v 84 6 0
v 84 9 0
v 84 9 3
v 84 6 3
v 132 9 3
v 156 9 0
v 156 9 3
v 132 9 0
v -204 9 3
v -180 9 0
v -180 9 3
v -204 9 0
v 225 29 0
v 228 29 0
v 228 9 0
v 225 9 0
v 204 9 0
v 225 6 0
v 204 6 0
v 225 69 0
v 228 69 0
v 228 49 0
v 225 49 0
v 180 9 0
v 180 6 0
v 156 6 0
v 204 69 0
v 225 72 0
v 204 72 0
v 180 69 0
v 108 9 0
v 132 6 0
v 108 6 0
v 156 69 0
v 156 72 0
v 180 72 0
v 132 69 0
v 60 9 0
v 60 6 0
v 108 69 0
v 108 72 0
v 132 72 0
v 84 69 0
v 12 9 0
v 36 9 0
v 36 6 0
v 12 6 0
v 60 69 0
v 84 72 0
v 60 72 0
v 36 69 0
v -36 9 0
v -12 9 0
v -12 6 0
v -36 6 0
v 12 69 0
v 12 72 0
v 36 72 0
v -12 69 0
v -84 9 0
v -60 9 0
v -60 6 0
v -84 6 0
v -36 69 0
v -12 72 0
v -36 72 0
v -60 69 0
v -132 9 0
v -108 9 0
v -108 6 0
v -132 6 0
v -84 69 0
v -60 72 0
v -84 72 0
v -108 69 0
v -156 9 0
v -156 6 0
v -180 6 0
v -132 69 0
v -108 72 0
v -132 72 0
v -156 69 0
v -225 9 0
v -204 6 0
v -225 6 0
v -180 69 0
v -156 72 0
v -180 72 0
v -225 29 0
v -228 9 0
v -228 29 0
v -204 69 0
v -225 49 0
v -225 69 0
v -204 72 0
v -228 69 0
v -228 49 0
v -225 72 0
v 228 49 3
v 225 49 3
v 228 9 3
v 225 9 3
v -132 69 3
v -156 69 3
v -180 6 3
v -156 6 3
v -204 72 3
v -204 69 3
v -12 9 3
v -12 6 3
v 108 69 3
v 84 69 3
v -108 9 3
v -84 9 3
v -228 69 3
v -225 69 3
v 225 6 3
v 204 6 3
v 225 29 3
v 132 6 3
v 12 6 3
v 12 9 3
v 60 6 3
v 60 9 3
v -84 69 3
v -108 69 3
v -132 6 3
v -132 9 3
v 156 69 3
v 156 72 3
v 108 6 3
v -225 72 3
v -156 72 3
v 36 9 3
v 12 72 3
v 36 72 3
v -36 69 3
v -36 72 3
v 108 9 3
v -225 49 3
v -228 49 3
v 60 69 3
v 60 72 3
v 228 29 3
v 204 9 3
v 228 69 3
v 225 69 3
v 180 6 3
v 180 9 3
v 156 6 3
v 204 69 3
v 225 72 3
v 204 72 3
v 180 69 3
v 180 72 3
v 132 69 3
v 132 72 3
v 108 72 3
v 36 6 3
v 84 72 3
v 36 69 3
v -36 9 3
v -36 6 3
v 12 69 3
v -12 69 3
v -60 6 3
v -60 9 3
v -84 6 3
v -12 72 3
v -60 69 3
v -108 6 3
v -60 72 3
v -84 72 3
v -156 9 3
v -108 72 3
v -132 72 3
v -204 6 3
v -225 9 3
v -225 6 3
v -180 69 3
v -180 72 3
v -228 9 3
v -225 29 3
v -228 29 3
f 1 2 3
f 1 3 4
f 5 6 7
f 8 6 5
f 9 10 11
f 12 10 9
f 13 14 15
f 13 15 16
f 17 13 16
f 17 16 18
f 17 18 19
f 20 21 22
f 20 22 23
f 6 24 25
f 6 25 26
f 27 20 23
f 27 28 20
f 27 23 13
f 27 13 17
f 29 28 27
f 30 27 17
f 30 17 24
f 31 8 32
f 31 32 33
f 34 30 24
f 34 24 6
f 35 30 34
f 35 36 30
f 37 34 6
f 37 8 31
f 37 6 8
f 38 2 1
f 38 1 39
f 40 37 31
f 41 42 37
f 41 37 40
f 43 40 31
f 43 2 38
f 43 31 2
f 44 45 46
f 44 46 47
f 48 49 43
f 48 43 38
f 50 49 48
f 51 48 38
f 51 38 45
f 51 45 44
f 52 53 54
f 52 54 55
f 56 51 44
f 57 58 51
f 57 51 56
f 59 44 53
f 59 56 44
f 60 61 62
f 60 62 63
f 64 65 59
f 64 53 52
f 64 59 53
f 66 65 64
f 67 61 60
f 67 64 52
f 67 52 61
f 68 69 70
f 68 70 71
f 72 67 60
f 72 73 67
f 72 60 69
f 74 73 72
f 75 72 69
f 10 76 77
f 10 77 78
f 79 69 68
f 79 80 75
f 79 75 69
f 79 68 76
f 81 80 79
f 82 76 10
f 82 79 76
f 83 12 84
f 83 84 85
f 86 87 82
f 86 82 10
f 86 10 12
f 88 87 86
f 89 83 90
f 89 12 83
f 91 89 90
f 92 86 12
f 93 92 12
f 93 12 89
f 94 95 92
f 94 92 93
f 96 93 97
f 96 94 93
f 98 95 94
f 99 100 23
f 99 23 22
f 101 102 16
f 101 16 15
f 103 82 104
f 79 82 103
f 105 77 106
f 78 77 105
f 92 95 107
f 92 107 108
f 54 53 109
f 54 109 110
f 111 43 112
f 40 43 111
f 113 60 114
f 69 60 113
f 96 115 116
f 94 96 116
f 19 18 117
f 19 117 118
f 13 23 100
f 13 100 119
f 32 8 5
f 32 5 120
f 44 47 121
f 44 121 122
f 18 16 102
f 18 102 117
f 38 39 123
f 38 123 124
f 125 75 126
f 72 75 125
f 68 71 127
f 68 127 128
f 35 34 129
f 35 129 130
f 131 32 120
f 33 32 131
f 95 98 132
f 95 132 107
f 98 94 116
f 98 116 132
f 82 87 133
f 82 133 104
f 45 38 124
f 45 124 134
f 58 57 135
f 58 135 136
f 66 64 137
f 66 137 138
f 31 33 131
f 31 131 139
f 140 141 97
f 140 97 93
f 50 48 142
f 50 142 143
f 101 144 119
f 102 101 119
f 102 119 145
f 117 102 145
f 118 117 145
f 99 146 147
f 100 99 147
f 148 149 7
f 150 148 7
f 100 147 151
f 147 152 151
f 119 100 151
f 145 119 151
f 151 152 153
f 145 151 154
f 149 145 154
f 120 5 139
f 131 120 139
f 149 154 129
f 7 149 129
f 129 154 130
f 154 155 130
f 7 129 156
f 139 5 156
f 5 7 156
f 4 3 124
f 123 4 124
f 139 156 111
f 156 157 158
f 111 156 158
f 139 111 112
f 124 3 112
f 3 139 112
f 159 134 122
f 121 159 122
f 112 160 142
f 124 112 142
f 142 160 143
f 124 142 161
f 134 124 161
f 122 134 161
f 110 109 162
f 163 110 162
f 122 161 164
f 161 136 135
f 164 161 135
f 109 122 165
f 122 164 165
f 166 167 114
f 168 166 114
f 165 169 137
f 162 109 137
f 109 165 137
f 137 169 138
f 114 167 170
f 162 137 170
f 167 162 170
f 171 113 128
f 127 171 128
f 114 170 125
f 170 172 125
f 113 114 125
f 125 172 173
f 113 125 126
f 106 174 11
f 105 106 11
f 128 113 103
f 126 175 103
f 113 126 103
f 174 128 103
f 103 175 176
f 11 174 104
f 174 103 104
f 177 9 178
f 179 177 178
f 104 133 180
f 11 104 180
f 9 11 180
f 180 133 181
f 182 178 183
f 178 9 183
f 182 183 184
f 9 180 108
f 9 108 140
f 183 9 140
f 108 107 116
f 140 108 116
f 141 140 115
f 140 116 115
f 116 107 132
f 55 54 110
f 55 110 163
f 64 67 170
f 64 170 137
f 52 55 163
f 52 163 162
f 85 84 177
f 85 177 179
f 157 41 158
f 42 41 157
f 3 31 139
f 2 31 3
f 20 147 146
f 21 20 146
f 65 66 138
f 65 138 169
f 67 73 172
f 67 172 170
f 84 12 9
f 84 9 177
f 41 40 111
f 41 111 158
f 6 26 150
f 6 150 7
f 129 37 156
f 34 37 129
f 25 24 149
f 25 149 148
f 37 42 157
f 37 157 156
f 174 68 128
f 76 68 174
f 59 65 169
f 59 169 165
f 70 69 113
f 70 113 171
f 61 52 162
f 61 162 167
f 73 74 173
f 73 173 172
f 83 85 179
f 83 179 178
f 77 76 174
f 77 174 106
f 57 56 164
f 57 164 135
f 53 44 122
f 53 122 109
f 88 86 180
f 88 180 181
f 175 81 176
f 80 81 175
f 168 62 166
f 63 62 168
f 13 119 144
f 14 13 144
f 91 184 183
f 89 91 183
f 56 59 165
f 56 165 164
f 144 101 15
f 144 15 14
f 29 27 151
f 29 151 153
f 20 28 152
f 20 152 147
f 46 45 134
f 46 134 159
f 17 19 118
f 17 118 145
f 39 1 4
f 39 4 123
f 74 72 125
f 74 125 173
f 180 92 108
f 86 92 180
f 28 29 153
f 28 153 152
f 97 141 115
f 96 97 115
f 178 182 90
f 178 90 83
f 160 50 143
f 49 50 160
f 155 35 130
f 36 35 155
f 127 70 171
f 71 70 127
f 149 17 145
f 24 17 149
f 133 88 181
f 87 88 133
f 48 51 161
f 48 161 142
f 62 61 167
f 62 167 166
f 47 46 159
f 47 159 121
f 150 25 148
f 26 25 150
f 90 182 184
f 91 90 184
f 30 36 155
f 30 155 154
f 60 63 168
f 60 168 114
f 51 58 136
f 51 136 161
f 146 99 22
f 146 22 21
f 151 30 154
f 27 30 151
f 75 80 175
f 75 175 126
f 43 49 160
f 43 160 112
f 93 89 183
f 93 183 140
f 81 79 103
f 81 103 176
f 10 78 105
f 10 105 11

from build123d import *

# Parameters (mm, degrees)
BOSS_EXTRUDE1_DEPTH = 3
SKETCH3_W           = 3
SKETCH3_H           = 20
BOSS_EXTRUDE2_DEPTH = 3


with BuildPart() as part:
    # Sketch1 → Boss-Extrude1 (new body)
    with BuildSketch(Plane.XY):
        Polygon((-204, 9), (-204, 6), (-225, 6), (-225, 72), (-204, 72), (-204, 69), (-180, 69), (-180, 72), (-156, 72), (-156, 69), (-132, 69), (-132, 72), (-108, 72), (-108, 69), (-84, 69), (-84, 72), (-60, 72), (-60, 69), (-36, 69), (-36, 72), (-12, 72), (-12, 69), (12, 69), (12, 72), (36, 72), (36, 69), (60, 69), (60, 72), (84, 72), (84, 69), (108, 69), (108, 72), (132, 72), (132, 69), (156, 69), (156, 72), (180, 72), (180, 69), (204, 69), (204, 72), (225, 72), (225, 6), (204, 6), (204, 9), (180, 9), (180, 6), (156, 6), (156, 9), (132, 9), (132, 6), (108, 6), (108, 9), (84, 9), (84, 6), (60, 6), (60, 9), (36, 9), (36, 6), (12, 6), (12, 9), (-12, 9), (-12, 6), (-36, 6), (-36, 9), (-60, 9), (-60, 6), (-84, 6), (-84, 9), (-108, 9), (-108, 6), (-132, 6), (-132, 9), (-156, 9), (-156, 6), (-180, 6), (-180, 9), align=None)
    extrude(amount=BOSS_EXTRUDE1_DEPTH)

    # Sketch3 → Boss-Extrude2 (add)
    with BuildSketch(Plane.XY.offset(3)):
        with Locations((-226.5, 59)):
            Rectangle(SKETCH3_W, SKETCH3_H)
        with Locations((-226.5, 19)):
            Rectangle(SKETCH3_W, SKETCH3_H)
        with Locations((226.5, 59)):
            Rectangle(SKETCH3_W, SKETCH3_H)
        with Locations((226.5, 19)):
            Rectangle(SKETCH3_W, SKETCH3_H)
    extrude(amount=-BOSS_EXTRUDE2_DEPTH)


solid = part.part
